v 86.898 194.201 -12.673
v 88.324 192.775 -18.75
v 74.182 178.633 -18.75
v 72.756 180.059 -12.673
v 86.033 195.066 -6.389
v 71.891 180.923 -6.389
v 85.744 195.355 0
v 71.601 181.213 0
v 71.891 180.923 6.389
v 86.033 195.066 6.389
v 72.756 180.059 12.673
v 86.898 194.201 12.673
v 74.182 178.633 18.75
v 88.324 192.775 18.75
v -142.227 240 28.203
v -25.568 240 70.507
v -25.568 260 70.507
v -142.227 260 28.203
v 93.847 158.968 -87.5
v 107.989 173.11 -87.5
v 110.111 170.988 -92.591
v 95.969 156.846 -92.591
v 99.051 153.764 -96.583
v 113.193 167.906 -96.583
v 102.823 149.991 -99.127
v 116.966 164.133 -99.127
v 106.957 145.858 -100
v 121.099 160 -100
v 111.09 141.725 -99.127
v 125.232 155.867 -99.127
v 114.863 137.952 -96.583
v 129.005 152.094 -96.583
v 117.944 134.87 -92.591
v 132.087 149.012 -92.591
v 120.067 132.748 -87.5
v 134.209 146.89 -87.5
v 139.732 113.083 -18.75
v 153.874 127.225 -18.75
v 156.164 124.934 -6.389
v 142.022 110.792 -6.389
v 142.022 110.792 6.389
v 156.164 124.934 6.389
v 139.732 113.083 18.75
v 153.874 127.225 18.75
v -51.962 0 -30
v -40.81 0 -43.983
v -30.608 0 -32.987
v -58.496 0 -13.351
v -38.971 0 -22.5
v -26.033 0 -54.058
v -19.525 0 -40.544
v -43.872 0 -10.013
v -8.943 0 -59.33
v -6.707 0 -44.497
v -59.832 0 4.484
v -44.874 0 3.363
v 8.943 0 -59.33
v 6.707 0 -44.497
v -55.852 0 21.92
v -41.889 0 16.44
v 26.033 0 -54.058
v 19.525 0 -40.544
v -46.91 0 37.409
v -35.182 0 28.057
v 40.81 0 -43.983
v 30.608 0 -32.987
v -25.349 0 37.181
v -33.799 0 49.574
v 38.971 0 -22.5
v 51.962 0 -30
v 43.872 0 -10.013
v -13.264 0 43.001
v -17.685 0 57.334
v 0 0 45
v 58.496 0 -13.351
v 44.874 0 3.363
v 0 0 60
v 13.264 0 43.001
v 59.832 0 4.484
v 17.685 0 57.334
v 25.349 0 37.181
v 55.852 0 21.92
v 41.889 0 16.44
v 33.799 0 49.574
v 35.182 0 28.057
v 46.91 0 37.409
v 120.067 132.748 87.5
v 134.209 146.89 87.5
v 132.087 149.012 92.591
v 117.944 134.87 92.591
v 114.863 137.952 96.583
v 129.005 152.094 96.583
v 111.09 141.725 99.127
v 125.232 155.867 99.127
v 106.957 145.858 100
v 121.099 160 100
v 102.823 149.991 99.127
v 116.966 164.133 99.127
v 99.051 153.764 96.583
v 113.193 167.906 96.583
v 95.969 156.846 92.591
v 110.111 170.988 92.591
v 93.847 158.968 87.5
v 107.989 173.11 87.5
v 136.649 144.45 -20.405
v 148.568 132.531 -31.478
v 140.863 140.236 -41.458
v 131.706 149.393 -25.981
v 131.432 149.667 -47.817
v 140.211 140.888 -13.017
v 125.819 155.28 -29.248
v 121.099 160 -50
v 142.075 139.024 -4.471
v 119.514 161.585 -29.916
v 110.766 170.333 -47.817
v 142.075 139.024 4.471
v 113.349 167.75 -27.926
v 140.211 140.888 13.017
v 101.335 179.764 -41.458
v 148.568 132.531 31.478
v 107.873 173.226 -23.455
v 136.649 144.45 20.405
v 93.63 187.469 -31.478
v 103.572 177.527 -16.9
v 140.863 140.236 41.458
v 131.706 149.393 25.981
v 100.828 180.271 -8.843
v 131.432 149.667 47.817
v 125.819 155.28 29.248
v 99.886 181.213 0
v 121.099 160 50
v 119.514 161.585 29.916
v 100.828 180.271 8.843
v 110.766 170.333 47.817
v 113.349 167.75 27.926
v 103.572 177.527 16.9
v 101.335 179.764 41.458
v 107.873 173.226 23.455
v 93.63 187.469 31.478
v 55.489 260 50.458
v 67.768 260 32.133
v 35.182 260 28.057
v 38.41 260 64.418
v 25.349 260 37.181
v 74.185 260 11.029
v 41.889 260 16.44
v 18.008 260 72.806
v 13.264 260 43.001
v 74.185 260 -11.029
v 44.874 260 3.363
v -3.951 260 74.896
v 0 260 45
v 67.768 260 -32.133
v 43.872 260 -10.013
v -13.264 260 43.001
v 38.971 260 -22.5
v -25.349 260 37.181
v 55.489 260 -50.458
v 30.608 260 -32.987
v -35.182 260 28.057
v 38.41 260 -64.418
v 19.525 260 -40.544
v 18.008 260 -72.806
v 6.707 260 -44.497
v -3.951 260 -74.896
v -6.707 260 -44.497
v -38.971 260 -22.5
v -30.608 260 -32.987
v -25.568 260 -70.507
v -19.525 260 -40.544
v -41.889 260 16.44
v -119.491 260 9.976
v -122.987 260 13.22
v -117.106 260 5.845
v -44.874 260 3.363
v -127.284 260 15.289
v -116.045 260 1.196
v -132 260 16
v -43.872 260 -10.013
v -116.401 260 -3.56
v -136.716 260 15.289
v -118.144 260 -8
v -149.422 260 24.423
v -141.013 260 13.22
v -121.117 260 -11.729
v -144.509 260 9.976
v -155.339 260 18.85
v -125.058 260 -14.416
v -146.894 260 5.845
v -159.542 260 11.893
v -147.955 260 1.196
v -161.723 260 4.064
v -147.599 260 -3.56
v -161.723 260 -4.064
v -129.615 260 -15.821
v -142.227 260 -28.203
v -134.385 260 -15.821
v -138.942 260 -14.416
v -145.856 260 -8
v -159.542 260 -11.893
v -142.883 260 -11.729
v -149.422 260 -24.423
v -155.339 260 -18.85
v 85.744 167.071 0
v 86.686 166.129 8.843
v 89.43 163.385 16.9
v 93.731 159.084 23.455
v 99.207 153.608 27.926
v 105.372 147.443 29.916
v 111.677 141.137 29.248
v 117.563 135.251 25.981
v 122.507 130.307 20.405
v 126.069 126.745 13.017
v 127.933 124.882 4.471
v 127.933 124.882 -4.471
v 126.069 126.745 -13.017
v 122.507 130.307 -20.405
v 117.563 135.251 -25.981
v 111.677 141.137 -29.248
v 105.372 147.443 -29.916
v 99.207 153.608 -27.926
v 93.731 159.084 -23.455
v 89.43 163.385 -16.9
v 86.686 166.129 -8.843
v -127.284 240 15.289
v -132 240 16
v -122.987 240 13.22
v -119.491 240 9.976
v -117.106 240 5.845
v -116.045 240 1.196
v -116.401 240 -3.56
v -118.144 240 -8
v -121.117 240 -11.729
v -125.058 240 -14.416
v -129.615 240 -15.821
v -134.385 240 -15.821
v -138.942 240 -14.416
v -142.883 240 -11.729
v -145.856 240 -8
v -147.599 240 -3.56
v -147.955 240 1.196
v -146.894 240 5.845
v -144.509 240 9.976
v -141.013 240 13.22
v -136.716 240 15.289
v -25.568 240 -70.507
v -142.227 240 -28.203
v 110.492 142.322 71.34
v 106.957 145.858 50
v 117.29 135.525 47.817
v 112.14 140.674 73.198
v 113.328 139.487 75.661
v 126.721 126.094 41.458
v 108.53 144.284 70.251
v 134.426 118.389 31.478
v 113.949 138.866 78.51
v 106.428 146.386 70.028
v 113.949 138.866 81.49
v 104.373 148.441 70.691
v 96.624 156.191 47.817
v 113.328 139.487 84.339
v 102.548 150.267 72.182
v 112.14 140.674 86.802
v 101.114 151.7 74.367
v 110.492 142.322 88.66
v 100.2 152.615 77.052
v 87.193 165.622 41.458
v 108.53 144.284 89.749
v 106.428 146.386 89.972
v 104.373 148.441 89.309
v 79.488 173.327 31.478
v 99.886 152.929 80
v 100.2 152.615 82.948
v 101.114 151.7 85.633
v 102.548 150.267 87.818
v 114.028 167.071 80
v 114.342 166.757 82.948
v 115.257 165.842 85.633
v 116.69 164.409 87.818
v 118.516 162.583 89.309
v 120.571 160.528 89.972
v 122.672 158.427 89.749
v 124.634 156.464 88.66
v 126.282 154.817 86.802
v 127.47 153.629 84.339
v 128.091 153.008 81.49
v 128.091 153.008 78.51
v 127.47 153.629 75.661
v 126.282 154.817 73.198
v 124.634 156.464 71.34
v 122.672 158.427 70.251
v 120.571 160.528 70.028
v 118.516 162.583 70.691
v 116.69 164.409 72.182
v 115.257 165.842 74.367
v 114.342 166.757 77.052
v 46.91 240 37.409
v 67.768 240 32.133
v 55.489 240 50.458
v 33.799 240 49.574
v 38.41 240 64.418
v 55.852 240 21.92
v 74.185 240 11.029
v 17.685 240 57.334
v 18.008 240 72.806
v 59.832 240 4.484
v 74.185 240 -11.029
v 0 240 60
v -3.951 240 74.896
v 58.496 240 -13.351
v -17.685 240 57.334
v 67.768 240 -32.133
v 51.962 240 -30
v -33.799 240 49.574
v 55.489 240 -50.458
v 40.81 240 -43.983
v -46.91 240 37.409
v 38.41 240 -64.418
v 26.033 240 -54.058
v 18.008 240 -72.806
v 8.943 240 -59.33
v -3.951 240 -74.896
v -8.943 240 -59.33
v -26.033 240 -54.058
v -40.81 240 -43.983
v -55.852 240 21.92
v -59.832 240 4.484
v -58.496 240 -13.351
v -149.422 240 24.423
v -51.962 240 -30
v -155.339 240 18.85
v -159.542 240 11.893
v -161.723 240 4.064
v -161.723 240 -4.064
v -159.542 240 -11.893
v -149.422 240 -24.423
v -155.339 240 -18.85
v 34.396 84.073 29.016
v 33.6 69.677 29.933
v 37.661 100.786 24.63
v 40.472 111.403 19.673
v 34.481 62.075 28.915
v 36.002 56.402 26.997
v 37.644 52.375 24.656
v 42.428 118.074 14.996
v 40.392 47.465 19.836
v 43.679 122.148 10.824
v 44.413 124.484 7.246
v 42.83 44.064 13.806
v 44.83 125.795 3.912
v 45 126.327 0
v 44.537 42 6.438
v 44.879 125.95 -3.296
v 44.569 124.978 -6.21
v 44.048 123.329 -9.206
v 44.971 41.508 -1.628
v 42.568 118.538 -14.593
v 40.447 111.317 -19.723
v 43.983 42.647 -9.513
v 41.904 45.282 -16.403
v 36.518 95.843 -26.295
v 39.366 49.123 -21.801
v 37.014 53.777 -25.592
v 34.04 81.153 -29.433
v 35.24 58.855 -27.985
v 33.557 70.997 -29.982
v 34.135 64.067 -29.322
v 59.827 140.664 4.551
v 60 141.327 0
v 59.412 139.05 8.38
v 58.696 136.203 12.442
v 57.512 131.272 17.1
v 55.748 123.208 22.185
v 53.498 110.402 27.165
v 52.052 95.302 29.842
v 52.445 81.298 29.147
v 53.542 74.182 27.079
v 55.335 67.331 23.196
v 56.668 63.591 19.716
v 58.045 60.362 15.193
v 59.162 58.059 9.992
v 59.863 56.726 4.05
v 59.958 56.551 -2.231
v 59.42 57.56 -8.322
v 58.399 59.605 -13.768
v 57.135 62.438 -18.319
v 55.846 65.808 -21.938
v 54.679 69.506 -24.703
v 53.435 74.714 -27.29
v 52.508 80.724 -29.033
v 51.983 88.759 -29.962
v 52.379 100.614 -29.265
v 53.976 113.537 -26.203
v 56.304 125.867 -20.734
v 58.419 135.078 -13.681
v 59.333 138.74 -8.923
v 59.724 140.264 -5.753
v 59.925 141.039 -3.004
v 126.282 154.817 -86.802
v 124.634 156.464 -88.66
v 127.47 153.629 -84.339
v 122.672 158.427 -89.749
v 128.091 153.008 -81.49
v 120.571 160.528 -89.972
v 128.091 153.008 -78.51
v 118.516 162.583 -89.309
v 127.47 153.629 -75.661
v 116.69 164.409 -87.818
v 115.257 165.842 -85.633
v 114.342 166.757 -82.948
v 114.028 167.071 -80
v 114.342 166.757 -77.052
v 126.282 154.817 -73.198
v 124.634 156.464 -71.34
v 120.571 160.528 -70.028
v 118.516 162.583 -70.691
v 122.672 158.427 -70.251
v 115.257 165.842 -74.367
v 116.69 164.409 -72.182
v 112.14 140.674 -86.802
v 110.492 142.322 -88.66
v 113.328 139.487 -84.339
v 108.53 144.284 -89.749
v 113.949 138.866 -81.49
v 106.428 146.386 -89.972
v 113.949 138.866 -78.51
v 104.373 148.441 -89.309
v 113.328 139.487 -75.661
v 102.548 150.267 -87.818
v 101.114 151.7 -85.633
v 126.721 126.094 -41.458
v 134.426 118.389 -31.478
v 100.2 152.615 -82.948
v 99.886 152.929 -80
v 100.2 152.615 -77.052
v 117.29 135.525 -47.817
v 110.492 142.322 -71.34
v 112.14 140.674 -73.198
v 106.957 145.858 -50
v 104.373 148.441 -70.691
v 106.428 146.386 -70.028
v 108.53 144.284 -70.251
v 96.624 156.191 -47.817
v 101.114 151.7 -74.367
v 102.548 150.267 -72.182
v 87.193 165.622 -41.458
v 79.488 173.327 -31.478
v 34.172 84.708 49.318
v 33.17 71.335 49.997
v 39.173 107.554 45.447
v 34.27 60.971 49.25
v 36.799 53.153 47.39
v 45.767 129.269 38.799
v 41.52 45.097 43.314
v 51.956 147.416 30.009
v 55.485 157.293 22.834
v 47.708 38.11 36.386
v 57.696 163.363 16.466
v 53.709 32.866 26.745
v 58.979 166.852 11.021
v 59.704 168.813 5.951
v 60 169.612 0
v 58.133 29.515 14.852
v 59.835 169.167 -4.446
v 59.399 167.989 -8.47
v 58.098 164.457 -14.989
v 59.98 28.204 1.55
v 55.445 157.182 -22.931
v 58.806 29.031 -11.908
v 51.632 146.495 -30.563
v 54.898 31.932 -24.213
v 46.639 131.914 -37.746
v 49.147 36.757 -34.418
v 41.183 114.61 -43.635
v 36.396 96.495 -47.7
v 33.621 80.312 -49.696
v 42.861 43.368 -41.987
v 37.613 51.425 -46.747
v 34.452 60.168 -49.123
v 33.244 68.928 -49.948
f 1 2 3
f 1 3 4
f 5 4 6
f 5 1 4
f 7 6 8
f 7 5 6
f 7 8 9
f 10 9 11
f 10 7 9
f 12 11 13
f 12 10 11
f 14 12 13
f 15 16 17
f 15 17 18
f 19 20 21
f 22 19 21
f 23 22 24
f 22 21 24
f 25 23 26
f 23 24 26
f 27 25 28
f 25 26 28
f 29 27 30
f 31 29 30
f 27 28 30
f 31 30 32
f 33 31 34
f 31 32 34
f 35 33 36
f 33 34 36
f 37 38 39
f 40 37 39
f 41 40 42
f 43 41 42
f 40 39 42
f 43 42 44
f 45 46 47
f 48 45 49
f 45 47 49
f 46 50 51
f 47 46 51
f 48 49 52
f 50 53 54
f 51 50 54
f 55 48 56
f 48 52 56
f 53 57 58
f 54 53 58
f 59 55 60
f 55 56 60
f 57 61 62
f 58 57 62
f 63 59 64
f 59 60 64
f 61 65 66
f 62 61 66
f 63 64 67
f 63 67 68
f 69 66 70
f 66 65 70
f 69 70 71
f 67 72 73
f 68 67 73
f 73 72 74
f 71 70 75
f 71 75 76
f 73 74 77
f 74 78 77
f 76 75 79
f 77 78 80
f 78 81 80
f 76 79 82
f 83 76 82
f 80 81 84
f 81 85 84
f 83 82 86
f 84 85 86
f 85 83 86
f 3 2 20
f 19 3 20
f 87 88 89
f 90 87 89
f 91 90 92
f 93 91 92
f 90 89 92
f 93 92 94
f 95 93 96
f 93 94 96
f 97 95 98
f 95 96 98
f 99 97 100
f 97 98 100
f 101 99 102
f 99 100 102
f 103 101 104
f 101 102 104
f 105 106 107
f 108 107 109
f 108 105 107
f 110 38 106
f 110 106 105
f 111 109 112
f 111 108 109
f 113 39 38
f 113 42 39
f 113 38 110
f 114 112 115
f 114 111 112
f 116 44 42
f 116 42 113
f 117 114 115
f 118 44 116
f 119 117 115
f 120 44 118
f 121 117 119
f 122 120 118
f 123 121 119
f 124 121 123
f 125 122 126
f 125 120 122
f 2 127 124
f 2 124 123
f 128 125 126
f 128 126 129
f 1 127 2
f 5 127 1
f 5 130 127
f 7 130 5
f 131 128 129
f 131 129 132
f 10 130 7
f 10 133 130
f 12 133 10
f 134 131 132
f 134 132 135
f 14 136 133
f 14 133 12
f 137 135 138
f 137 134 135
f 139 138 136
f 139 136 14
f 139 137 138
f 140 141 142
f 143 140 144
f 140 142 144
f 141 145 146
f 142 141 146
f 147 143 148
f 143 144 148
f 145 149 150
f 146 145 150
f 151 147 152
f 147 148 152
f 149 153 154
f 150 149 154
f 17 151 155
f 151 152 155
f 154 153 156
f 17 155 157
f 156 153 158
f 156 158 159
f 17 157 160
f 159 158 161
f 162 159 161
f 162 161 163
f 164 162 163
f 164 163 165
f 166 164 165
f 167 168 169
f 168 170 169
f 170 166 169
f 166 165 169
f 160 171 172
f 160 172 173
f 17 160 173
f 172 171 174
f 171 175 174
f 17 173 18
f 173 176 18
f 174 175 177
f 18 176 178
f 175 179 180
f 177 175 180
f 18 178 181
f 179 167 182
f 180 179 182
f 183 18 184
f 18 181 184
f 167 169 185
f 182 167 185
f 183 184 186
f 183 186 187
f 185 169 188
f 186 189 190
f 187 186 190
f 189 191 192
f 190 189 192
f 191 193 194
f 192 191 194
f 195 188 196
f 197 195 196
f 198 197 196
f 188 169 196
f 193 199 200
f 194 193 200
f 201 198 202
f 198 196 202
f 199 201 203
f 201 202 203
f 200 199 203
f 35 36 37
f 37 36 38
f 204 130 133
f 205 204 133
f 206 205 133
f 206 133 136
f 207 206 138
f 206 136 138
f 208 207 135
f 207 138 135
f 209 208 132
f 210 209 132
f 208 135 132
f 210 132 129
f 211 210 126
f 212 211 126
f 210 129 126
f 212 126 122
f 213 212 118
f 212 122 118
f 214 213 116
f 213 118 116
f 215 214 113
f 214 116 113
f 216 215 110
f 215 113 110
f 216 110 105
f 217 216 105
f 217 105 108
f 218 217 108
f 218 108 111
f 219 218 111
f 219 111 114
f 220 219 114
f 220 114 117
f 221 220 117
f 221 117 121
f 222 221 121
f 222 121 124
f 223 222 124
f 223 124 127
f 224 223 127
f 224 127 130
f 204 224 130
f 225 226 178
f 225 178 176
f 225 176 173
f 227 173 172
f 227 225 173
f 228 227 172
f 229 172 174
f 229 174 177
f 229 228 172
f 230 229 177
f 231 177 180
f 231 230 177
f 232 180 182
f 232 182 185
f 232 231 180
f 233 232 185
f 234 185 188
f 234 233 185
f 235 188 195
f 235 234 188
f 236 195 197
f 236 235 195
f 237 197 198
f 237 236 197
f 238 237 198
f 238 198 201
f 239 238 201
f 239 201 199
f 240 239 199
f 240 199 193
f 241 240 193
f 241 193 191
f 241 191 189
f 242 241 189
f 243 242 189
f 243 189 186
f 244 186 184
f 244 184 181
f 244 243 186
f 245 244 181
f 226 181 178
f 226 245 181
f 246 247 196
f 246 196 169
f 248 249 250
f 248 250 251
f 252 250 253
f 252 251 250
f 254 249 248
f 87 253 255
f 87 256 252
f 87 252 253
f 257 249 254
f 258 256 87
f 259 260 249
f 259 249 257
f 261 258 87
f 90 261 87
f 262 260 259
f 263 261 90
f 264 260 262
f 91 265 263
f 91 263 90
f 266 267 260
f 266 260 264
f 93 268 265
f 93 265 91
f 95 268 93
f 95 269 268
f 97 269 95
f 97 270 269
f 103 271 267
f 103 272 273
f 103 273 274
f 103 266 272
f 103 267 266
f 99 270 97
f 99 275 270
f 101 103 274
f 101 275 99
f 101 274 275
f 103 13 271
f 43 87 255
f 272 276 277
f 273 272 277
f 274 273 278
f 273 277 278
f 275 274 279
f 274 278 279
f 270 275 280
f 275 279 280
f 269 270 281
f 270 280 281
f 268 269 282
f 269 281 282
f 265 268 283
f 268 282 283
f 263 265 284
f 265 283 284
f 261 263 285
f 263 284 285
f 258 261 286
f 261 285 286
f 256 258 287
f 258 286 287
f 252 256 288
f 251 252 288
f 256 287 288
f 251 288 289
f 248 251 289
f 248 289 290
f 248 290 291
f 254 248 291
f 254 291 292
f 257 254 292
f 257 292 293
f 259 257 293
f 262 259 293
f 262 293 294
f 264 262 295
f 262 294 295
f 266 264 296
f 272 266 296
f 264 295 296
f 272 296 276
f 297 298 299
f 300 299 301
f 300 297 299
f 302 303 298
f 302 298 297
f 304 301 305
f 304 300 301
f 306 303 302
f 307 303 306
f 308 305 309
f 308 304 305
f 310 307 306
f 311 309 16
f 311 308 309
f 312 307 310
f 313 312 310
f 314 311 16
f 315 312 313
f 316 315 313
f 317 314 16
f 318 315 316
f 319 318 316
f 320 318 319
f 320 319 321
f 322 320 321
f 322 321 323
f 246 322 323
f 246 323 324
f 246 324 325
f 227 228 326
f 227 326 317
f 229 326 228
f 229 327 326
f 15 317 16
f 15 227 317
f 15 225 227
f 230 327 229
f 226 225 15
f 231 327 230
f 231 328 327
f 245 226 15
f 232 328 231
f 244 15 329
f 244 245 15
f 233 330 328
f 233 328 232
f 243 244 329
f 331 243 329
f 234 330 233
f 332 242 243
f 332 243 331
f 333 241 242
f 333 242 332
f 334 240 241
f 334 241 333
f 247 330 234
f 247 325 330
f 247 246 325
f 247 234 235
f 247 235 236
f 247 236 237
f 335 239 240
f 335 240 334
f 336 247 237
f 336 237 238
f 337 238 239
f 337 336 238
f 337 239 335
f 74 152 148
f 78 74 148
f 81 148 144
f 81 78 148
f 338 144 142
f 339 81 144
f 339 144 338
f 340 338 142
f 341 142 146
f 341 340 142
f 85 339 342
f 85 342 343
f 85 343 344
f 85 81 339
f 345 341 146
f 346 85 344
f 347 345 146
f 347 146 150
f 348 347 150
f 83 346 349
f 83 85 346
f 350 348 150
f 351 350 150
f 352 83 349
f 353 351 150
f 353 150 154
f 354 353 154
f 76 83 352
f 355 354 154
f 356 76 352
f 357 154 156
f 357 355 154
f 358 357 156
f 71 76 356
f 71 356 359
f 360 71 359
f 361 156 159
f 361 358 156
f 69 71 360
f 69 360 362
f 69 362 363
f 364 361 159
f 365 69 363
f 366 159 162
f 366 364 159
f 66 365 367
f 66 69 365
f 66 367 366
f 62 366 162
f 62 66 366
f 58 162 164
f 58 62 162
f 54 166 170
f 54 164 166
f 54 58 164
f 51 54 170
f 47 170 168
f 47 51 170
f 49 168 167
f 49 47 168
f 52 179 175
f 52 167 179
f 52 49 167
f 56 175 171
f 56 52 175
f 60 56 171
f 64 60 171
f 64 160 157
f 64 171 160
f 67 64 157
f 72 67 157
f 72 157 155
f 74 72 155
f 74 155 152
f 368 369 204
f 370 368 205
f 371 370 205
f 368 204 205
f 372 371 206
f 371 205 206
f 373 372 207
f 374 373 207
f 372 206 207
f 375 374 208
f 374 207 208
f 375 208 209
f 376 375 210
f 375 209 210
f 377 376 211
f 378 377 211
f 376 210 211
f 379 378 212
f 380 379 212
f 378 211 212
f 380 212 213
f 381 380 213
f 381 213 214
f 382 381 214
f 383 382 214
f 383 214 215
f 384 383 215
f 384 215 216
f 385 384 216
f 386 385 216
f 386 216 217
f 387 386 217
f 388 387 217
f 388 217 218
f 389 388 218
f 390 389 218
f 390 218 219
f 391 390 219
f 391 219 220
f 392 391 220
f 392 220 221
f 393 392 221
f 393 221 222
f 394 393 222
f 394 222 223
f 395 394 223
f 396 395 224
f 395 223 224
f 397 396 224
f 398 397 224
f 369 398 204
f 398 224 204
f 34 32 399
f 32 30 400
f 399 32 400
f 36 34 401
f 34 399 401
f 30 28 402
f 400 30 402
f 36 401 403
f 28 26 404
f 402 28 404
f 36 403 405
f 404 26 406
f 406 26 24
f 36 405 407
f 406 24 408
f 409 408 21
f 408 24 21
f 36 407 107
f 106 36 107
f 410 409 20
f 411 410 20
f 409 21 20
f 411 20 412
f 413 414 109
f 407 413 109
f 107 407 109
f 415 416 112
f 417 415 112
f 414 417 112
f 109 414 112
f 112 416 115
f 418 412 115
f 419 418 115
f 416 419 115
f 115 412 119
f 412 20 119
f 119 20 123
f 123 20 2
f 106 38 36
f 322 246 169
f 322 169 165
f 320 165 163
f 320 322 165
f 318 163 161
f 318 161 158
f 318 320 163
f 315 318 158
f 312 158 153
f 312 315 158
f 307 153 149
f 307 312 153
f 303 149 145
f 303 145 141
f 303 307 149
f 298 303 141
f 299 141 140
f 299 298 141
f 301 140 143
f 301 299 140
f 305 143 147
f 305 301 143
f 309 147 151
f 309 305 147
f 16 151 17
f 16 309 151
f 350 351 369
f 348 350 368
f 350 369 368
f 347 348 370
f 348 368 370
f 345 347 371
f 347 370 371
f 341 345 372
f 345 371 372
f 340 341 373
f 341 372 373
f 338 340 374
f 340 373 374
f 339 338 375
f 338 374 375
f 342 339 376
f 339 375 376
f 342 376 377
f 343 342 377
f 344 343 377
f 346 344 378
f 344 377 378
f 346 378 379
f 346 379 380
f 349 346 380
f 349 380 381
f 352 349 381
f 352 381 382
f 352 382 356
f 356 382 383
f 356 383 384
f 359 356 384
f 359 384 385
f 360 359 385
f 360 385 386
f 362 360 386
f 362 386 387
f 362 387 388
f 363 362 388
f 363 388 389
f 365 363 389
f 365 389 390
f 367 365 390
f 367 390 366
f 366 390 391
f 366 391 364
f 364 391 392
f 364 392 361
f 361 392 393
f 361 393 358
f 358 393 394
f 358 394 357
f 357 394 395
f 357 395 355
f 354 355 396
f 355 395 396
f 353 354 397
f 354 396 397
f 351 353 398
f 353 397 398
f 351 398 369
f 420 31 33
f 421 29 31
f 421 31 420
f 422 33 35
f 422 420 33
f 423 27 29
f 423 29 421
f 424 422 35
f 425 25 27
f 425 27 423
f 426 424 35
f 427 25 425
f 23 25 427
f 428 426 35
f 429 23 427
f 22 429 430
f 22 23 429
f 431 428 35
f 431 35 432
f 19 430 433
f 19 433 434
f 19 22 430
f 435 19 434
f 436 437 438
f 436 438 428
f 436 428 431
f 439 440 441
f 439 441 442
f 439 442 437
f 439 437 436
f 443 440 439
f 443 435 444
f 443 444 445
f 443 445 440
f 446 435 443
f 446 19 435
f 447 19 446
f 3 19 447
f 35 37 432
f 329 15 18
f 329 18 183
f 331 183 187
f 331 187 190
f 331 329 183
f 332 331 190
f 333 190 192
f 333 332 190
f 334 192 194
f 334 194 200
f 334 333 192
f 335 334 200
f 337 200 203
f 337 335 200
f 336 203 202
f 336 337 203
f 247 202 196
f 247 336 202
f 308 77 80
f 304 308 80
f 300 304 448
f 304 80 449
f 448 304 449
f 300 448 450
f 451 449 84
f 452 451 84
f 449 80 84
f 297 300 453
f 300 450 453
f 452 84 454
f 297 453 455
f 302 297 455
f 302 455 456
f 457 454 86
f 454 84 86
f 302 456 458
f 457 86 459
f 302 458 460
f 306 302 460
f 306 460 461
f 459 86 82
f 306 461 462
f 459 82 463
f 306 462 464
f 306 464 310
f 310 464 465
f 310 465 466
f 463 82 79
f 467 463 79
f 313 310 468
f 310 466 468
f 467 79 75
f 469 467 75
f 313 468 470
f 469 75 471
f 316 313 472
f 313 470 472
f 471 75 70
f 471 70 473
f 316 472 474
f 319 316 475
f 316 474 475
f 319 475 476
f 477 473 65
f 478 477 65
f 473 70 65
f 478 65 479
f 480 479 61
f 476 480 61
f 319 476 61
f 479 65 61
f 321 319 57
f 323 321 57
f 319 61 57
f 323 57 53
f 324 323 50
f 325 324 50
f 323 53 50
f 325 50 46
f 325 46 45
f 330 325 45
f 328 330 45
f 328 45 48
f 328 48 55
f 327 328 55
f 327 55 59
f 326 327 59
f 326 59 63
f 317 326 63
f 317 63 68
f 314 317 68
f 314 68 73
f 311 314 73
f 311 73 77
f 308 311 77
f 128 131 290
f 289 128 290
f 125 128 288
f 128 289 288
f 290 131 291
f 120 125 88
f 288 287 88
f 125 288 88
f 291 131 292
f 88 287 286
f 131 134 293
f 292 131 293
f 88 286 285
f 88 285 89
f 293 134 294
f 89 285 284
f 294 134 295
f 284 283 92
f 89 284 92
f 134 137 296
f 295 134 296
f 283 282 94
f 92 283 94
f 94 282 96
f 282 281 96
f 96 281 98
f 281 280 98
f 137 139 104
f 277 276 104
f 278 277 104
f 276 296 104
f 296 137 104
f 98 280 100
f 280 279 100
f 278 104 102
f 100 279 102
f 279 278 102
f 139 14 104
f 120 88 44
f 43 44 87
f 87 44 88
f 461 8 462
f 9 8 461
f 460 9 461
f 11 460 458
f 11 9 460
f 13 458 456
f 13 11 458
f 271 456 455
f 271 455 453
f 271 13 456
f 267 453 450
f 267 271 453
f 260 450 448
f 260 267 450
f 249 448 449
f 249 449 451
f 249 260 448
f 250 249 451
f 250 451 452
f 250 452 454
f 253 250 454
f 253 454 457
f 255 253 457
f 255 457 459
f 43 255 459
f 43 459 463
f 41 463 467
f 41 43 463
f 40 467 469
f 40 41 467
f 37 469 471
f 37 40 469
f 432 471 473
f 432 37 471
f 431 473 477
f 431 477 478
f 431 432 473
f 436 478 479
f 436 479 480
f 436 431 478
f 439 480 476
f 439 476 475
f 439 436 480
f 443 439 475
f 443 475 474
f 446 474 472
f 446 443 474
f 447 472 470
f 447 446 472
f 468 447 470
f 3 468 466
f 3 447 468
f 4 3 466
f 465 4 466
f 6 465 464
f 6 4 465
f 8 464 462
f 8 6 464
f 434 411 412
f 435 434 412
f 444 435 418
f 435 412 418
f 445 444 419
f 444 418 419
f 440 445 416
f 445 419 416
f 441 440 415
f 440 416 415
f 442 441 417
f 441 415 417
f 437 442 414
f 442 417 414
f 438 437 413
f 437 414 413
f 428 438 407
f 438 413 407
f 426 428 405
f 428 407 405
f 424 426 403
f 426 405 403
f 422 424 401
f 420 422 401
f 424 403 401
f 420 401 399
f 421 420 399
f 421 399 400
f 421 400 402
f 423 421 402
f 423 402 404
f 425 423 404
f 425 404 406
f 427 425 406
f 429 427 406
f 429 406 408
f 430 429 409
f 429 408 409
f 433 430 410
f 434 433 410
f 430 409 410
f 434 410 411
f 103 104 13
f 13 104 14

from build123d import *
from build123d.topology import SkipClean

# Parameters (mm, degrees)
SKETCH_1_R                      = 60
EXTRUDE_1_DEPTH                 = 240
SKETCH_2_R                      = 16
EXTRUDE_2_DEPTH                 = 20
CUT_EXTRUDE_1_DEPTH             = 316.38706378
CUT_EXTRUDE_1_DEPTH_BACK        = 316.38706378
SKETCH_6_R                      = 45
EXTRUDE_3_REACH                 = 335.721
EXTRUDE_3_END_RADIUS            = 60
SKETCH_5_R                      = 50
SKETCH_5_R_2                    = 30
CUT_EXTRUDE_2_REACH             = 343.929
SKETCH_8_R                      = 30
CUT_EXTRUDE_2_DIRECTION_2_DEPTH = 342.928852652
SKETCH_9_R                      = 10
SKETCH_9_R_2                    = 30
EXTRUDE_4_DEPTH                 = 20


with BuildPart() as part:
    # 草图1 → 凸台-拉伸1 (new body)
    with BuildSketch(Plane(origin=(0, 0, 0), x_dir=(1, 0, 0), z_dir=(0, 1, 0))):
        with Locations(Location((0, 0, 0), (0, 0, 270))):
            Circle(SKETCH_1_R)
    extrude(amount=EXTRUDE_1_DEPTH)

    # 草图2 → 凸台-拉伸2 (add)
    with BuildSketch(Plane(origin=(0, 240, 0), x_dir=(1, 0, 0), z_dir=(0, 1, 0))):
        with BuildLine():
            Line((-142.227272727, 28.202888018), (-25.568181818, 70.507220045))
            ThreePointArc((-25.568181818, 70.507220045), (75, 0), (-25.568181818, -70.507220045))
            Line((-25.568181818, -70.507220045), (-142.227272727, -28.202888018))
            ThreePointArc((-142.227272727, -28.202888018), (-162, 0), (-142.227272727, 28.202888018))
        make_face()
        with Locations(Location((-132, 0, 0), (0, 0, 270))):
            Circle(SKETCH_2_R, mode=Mode.SUBTRACT)
    extrude(amount=EXTRUDE_2_DEPTH)

    # 草图6 → 切除-拉伸1 (cut, two sides: drawn at the far end of the back side and taken through both)
    with BuildSketch(Plane(origin=(0, 260, 0), x_dir=(1, 0, 0), z_dir=(0, 1, 0)).offset(-CUT_EXTRUDE_1_DEPTH_BACK)):
        with Locations(Location((0, 0, 0), (0, 0, 270))):
            Circle(SKETCH_6_R)
    extrude(amount=CUT_EXTRUDE_1_DEPTH + CUT_EXTRUDE_1_DEPTH_BACK, mode=Mode.SUBTRACT)

    # 凸台-拉伸3: up to this cylinder (the profile starts outside it)
    extrude_3_end = Plane(origin=(0, 125.644661, 0), z_dir=(0, -1, 0)) * Cylinder(EXTRUDE_3_END_RADIUS, 792.442, mode=Mode.PRIVATE)
    # 草图5 → 凸台-拉伸3 (add, up to the surface)
    with BuildSketch(Plane(origin=(121.098951134, 160, 0), x_dir=(0.7071067811865488, -0.7071067811865464, 0), z_dir=(0.7071067811865464, 0.7071067811865488, 0)), mode=Mode.PRIVATE) as extrude_3_sk1:
        with Locations(Location((0, 0, 0), (0, 0, 180))):
            Circle(SKETCH_5_R)
        with Locations(Location((0, 0, 0), (0, 0, 180))):
            Circle(SKETCH_5_R_2, mode=Mode.SUBTRACT)
    extrude_3_tool1 = extrude(extrude_3_sk1.sketch, amount=-EXTRUDE_3_REACH, mode=Mode.PRIVATE) - extrude_3_end
    add(extrude_3_tool1.solids().sort_by_distance((155.45429, 125.644661, 0))[0])

    # 草图8 → 切除-拉伸2 (cut, up to next)
    with BuildSketch(Plane(origin=(140.549475567, 140.549475567, 0), x_dir=(0, 0, -1), z_dir=(0.7071067811865465, 0.7071067811865487, 0)), mode=Mode.PRIVATE) as cut_extrude_2_sk1:
        with Locations(Location((0, 27.507195448, 0), (0, 0, 90))):
            Circle(SKETCH_8_R)
    cut_extrude_2_tool1 = extrude(cut_extrude_2_sk1.sketch, amount=-CUT_EXTRUDE_2_REACH, mode=Mode.PRIVATE) & part.part
    add(cut_extrude_2_tool1.solids().sort_by_distance((121.098951, 160, 0))[0], mode=Mode.SUBTRACT)

    # 草图8 → 切除-拉伸2 direction 2 (cut)
    with BuildSketch(Plane(origin=(140.549475567, 140.549475567, 0), x_dir=(0, 0, -1), z_dir=(0.7071067811865465, 0.7071067811865487, 0))):
        with Locations(Location((0, 27.507195448, 0), (0, 0, 90))):
            Circle(SKETCH_8_R)
    extrude(amount=CUT_EXTRUDE_2_DIRECTION_2_DEPTH, mode=Mode.SUBTRACT)

    # 草图9 → 凸台-拉伸4 (add)
    with SkipClean():  # the faces are left unmerged after this step: merging them gives an invalid solid
        with BuildSketch(Plane(origin=(140.549475567, 140.549475567, 0), x_dir=(0, 0, -1), z_dir=(0.7071067811865465, 0.7071067811865487, 0))):
            with BuildLine():
                Line((-87.5, 46.047691666), (-18.75, 73.858435993))
                ThreePointArc((-18.75, 73.858435993), (0, 77.507195448), (18.75, 73.858435993))
                Line((18.75, 73.858435993), (87.5, 46.047691666))
                ThreePointArc((87.5, 46.047691666), (100, 27.507195448), (87.5, 8.966699231))
                Line((87.5, 8.966699231), (18.75, -18.844045096))
                ThreePointArc((18.75, -18.844045096), (0, -22.492804552), (-18.75, -18.844045096))
                Line((-18.75, -18.844045096), (-87.5, 8.966699231))
                ThreePointArc((-87.5, 8.966699231), (-100, 27.507195448), (-87.5, 46.047691666))
            make_face()
            with Locations(Location((-80, 27.507195448, 0), (0, 0, 90))):
                Circle(SKETCH_9_R, mode=Mode.SUBTRACT)
            with Locations(Location((80, 27.507195448, 0), (0, 0, 90))):
                Circle(SKETCH_9_R, mode=Mode.SUBTRACT)
            with Locations(Location((0, 27.507195448, 0), (0, 0, 90))):
                Circle(SKETCH_9_R_2, mode=Mode.SUBTRACT)
        extrude(amount=-EXTRUDE_4_DEPTH)


solid = part.part
